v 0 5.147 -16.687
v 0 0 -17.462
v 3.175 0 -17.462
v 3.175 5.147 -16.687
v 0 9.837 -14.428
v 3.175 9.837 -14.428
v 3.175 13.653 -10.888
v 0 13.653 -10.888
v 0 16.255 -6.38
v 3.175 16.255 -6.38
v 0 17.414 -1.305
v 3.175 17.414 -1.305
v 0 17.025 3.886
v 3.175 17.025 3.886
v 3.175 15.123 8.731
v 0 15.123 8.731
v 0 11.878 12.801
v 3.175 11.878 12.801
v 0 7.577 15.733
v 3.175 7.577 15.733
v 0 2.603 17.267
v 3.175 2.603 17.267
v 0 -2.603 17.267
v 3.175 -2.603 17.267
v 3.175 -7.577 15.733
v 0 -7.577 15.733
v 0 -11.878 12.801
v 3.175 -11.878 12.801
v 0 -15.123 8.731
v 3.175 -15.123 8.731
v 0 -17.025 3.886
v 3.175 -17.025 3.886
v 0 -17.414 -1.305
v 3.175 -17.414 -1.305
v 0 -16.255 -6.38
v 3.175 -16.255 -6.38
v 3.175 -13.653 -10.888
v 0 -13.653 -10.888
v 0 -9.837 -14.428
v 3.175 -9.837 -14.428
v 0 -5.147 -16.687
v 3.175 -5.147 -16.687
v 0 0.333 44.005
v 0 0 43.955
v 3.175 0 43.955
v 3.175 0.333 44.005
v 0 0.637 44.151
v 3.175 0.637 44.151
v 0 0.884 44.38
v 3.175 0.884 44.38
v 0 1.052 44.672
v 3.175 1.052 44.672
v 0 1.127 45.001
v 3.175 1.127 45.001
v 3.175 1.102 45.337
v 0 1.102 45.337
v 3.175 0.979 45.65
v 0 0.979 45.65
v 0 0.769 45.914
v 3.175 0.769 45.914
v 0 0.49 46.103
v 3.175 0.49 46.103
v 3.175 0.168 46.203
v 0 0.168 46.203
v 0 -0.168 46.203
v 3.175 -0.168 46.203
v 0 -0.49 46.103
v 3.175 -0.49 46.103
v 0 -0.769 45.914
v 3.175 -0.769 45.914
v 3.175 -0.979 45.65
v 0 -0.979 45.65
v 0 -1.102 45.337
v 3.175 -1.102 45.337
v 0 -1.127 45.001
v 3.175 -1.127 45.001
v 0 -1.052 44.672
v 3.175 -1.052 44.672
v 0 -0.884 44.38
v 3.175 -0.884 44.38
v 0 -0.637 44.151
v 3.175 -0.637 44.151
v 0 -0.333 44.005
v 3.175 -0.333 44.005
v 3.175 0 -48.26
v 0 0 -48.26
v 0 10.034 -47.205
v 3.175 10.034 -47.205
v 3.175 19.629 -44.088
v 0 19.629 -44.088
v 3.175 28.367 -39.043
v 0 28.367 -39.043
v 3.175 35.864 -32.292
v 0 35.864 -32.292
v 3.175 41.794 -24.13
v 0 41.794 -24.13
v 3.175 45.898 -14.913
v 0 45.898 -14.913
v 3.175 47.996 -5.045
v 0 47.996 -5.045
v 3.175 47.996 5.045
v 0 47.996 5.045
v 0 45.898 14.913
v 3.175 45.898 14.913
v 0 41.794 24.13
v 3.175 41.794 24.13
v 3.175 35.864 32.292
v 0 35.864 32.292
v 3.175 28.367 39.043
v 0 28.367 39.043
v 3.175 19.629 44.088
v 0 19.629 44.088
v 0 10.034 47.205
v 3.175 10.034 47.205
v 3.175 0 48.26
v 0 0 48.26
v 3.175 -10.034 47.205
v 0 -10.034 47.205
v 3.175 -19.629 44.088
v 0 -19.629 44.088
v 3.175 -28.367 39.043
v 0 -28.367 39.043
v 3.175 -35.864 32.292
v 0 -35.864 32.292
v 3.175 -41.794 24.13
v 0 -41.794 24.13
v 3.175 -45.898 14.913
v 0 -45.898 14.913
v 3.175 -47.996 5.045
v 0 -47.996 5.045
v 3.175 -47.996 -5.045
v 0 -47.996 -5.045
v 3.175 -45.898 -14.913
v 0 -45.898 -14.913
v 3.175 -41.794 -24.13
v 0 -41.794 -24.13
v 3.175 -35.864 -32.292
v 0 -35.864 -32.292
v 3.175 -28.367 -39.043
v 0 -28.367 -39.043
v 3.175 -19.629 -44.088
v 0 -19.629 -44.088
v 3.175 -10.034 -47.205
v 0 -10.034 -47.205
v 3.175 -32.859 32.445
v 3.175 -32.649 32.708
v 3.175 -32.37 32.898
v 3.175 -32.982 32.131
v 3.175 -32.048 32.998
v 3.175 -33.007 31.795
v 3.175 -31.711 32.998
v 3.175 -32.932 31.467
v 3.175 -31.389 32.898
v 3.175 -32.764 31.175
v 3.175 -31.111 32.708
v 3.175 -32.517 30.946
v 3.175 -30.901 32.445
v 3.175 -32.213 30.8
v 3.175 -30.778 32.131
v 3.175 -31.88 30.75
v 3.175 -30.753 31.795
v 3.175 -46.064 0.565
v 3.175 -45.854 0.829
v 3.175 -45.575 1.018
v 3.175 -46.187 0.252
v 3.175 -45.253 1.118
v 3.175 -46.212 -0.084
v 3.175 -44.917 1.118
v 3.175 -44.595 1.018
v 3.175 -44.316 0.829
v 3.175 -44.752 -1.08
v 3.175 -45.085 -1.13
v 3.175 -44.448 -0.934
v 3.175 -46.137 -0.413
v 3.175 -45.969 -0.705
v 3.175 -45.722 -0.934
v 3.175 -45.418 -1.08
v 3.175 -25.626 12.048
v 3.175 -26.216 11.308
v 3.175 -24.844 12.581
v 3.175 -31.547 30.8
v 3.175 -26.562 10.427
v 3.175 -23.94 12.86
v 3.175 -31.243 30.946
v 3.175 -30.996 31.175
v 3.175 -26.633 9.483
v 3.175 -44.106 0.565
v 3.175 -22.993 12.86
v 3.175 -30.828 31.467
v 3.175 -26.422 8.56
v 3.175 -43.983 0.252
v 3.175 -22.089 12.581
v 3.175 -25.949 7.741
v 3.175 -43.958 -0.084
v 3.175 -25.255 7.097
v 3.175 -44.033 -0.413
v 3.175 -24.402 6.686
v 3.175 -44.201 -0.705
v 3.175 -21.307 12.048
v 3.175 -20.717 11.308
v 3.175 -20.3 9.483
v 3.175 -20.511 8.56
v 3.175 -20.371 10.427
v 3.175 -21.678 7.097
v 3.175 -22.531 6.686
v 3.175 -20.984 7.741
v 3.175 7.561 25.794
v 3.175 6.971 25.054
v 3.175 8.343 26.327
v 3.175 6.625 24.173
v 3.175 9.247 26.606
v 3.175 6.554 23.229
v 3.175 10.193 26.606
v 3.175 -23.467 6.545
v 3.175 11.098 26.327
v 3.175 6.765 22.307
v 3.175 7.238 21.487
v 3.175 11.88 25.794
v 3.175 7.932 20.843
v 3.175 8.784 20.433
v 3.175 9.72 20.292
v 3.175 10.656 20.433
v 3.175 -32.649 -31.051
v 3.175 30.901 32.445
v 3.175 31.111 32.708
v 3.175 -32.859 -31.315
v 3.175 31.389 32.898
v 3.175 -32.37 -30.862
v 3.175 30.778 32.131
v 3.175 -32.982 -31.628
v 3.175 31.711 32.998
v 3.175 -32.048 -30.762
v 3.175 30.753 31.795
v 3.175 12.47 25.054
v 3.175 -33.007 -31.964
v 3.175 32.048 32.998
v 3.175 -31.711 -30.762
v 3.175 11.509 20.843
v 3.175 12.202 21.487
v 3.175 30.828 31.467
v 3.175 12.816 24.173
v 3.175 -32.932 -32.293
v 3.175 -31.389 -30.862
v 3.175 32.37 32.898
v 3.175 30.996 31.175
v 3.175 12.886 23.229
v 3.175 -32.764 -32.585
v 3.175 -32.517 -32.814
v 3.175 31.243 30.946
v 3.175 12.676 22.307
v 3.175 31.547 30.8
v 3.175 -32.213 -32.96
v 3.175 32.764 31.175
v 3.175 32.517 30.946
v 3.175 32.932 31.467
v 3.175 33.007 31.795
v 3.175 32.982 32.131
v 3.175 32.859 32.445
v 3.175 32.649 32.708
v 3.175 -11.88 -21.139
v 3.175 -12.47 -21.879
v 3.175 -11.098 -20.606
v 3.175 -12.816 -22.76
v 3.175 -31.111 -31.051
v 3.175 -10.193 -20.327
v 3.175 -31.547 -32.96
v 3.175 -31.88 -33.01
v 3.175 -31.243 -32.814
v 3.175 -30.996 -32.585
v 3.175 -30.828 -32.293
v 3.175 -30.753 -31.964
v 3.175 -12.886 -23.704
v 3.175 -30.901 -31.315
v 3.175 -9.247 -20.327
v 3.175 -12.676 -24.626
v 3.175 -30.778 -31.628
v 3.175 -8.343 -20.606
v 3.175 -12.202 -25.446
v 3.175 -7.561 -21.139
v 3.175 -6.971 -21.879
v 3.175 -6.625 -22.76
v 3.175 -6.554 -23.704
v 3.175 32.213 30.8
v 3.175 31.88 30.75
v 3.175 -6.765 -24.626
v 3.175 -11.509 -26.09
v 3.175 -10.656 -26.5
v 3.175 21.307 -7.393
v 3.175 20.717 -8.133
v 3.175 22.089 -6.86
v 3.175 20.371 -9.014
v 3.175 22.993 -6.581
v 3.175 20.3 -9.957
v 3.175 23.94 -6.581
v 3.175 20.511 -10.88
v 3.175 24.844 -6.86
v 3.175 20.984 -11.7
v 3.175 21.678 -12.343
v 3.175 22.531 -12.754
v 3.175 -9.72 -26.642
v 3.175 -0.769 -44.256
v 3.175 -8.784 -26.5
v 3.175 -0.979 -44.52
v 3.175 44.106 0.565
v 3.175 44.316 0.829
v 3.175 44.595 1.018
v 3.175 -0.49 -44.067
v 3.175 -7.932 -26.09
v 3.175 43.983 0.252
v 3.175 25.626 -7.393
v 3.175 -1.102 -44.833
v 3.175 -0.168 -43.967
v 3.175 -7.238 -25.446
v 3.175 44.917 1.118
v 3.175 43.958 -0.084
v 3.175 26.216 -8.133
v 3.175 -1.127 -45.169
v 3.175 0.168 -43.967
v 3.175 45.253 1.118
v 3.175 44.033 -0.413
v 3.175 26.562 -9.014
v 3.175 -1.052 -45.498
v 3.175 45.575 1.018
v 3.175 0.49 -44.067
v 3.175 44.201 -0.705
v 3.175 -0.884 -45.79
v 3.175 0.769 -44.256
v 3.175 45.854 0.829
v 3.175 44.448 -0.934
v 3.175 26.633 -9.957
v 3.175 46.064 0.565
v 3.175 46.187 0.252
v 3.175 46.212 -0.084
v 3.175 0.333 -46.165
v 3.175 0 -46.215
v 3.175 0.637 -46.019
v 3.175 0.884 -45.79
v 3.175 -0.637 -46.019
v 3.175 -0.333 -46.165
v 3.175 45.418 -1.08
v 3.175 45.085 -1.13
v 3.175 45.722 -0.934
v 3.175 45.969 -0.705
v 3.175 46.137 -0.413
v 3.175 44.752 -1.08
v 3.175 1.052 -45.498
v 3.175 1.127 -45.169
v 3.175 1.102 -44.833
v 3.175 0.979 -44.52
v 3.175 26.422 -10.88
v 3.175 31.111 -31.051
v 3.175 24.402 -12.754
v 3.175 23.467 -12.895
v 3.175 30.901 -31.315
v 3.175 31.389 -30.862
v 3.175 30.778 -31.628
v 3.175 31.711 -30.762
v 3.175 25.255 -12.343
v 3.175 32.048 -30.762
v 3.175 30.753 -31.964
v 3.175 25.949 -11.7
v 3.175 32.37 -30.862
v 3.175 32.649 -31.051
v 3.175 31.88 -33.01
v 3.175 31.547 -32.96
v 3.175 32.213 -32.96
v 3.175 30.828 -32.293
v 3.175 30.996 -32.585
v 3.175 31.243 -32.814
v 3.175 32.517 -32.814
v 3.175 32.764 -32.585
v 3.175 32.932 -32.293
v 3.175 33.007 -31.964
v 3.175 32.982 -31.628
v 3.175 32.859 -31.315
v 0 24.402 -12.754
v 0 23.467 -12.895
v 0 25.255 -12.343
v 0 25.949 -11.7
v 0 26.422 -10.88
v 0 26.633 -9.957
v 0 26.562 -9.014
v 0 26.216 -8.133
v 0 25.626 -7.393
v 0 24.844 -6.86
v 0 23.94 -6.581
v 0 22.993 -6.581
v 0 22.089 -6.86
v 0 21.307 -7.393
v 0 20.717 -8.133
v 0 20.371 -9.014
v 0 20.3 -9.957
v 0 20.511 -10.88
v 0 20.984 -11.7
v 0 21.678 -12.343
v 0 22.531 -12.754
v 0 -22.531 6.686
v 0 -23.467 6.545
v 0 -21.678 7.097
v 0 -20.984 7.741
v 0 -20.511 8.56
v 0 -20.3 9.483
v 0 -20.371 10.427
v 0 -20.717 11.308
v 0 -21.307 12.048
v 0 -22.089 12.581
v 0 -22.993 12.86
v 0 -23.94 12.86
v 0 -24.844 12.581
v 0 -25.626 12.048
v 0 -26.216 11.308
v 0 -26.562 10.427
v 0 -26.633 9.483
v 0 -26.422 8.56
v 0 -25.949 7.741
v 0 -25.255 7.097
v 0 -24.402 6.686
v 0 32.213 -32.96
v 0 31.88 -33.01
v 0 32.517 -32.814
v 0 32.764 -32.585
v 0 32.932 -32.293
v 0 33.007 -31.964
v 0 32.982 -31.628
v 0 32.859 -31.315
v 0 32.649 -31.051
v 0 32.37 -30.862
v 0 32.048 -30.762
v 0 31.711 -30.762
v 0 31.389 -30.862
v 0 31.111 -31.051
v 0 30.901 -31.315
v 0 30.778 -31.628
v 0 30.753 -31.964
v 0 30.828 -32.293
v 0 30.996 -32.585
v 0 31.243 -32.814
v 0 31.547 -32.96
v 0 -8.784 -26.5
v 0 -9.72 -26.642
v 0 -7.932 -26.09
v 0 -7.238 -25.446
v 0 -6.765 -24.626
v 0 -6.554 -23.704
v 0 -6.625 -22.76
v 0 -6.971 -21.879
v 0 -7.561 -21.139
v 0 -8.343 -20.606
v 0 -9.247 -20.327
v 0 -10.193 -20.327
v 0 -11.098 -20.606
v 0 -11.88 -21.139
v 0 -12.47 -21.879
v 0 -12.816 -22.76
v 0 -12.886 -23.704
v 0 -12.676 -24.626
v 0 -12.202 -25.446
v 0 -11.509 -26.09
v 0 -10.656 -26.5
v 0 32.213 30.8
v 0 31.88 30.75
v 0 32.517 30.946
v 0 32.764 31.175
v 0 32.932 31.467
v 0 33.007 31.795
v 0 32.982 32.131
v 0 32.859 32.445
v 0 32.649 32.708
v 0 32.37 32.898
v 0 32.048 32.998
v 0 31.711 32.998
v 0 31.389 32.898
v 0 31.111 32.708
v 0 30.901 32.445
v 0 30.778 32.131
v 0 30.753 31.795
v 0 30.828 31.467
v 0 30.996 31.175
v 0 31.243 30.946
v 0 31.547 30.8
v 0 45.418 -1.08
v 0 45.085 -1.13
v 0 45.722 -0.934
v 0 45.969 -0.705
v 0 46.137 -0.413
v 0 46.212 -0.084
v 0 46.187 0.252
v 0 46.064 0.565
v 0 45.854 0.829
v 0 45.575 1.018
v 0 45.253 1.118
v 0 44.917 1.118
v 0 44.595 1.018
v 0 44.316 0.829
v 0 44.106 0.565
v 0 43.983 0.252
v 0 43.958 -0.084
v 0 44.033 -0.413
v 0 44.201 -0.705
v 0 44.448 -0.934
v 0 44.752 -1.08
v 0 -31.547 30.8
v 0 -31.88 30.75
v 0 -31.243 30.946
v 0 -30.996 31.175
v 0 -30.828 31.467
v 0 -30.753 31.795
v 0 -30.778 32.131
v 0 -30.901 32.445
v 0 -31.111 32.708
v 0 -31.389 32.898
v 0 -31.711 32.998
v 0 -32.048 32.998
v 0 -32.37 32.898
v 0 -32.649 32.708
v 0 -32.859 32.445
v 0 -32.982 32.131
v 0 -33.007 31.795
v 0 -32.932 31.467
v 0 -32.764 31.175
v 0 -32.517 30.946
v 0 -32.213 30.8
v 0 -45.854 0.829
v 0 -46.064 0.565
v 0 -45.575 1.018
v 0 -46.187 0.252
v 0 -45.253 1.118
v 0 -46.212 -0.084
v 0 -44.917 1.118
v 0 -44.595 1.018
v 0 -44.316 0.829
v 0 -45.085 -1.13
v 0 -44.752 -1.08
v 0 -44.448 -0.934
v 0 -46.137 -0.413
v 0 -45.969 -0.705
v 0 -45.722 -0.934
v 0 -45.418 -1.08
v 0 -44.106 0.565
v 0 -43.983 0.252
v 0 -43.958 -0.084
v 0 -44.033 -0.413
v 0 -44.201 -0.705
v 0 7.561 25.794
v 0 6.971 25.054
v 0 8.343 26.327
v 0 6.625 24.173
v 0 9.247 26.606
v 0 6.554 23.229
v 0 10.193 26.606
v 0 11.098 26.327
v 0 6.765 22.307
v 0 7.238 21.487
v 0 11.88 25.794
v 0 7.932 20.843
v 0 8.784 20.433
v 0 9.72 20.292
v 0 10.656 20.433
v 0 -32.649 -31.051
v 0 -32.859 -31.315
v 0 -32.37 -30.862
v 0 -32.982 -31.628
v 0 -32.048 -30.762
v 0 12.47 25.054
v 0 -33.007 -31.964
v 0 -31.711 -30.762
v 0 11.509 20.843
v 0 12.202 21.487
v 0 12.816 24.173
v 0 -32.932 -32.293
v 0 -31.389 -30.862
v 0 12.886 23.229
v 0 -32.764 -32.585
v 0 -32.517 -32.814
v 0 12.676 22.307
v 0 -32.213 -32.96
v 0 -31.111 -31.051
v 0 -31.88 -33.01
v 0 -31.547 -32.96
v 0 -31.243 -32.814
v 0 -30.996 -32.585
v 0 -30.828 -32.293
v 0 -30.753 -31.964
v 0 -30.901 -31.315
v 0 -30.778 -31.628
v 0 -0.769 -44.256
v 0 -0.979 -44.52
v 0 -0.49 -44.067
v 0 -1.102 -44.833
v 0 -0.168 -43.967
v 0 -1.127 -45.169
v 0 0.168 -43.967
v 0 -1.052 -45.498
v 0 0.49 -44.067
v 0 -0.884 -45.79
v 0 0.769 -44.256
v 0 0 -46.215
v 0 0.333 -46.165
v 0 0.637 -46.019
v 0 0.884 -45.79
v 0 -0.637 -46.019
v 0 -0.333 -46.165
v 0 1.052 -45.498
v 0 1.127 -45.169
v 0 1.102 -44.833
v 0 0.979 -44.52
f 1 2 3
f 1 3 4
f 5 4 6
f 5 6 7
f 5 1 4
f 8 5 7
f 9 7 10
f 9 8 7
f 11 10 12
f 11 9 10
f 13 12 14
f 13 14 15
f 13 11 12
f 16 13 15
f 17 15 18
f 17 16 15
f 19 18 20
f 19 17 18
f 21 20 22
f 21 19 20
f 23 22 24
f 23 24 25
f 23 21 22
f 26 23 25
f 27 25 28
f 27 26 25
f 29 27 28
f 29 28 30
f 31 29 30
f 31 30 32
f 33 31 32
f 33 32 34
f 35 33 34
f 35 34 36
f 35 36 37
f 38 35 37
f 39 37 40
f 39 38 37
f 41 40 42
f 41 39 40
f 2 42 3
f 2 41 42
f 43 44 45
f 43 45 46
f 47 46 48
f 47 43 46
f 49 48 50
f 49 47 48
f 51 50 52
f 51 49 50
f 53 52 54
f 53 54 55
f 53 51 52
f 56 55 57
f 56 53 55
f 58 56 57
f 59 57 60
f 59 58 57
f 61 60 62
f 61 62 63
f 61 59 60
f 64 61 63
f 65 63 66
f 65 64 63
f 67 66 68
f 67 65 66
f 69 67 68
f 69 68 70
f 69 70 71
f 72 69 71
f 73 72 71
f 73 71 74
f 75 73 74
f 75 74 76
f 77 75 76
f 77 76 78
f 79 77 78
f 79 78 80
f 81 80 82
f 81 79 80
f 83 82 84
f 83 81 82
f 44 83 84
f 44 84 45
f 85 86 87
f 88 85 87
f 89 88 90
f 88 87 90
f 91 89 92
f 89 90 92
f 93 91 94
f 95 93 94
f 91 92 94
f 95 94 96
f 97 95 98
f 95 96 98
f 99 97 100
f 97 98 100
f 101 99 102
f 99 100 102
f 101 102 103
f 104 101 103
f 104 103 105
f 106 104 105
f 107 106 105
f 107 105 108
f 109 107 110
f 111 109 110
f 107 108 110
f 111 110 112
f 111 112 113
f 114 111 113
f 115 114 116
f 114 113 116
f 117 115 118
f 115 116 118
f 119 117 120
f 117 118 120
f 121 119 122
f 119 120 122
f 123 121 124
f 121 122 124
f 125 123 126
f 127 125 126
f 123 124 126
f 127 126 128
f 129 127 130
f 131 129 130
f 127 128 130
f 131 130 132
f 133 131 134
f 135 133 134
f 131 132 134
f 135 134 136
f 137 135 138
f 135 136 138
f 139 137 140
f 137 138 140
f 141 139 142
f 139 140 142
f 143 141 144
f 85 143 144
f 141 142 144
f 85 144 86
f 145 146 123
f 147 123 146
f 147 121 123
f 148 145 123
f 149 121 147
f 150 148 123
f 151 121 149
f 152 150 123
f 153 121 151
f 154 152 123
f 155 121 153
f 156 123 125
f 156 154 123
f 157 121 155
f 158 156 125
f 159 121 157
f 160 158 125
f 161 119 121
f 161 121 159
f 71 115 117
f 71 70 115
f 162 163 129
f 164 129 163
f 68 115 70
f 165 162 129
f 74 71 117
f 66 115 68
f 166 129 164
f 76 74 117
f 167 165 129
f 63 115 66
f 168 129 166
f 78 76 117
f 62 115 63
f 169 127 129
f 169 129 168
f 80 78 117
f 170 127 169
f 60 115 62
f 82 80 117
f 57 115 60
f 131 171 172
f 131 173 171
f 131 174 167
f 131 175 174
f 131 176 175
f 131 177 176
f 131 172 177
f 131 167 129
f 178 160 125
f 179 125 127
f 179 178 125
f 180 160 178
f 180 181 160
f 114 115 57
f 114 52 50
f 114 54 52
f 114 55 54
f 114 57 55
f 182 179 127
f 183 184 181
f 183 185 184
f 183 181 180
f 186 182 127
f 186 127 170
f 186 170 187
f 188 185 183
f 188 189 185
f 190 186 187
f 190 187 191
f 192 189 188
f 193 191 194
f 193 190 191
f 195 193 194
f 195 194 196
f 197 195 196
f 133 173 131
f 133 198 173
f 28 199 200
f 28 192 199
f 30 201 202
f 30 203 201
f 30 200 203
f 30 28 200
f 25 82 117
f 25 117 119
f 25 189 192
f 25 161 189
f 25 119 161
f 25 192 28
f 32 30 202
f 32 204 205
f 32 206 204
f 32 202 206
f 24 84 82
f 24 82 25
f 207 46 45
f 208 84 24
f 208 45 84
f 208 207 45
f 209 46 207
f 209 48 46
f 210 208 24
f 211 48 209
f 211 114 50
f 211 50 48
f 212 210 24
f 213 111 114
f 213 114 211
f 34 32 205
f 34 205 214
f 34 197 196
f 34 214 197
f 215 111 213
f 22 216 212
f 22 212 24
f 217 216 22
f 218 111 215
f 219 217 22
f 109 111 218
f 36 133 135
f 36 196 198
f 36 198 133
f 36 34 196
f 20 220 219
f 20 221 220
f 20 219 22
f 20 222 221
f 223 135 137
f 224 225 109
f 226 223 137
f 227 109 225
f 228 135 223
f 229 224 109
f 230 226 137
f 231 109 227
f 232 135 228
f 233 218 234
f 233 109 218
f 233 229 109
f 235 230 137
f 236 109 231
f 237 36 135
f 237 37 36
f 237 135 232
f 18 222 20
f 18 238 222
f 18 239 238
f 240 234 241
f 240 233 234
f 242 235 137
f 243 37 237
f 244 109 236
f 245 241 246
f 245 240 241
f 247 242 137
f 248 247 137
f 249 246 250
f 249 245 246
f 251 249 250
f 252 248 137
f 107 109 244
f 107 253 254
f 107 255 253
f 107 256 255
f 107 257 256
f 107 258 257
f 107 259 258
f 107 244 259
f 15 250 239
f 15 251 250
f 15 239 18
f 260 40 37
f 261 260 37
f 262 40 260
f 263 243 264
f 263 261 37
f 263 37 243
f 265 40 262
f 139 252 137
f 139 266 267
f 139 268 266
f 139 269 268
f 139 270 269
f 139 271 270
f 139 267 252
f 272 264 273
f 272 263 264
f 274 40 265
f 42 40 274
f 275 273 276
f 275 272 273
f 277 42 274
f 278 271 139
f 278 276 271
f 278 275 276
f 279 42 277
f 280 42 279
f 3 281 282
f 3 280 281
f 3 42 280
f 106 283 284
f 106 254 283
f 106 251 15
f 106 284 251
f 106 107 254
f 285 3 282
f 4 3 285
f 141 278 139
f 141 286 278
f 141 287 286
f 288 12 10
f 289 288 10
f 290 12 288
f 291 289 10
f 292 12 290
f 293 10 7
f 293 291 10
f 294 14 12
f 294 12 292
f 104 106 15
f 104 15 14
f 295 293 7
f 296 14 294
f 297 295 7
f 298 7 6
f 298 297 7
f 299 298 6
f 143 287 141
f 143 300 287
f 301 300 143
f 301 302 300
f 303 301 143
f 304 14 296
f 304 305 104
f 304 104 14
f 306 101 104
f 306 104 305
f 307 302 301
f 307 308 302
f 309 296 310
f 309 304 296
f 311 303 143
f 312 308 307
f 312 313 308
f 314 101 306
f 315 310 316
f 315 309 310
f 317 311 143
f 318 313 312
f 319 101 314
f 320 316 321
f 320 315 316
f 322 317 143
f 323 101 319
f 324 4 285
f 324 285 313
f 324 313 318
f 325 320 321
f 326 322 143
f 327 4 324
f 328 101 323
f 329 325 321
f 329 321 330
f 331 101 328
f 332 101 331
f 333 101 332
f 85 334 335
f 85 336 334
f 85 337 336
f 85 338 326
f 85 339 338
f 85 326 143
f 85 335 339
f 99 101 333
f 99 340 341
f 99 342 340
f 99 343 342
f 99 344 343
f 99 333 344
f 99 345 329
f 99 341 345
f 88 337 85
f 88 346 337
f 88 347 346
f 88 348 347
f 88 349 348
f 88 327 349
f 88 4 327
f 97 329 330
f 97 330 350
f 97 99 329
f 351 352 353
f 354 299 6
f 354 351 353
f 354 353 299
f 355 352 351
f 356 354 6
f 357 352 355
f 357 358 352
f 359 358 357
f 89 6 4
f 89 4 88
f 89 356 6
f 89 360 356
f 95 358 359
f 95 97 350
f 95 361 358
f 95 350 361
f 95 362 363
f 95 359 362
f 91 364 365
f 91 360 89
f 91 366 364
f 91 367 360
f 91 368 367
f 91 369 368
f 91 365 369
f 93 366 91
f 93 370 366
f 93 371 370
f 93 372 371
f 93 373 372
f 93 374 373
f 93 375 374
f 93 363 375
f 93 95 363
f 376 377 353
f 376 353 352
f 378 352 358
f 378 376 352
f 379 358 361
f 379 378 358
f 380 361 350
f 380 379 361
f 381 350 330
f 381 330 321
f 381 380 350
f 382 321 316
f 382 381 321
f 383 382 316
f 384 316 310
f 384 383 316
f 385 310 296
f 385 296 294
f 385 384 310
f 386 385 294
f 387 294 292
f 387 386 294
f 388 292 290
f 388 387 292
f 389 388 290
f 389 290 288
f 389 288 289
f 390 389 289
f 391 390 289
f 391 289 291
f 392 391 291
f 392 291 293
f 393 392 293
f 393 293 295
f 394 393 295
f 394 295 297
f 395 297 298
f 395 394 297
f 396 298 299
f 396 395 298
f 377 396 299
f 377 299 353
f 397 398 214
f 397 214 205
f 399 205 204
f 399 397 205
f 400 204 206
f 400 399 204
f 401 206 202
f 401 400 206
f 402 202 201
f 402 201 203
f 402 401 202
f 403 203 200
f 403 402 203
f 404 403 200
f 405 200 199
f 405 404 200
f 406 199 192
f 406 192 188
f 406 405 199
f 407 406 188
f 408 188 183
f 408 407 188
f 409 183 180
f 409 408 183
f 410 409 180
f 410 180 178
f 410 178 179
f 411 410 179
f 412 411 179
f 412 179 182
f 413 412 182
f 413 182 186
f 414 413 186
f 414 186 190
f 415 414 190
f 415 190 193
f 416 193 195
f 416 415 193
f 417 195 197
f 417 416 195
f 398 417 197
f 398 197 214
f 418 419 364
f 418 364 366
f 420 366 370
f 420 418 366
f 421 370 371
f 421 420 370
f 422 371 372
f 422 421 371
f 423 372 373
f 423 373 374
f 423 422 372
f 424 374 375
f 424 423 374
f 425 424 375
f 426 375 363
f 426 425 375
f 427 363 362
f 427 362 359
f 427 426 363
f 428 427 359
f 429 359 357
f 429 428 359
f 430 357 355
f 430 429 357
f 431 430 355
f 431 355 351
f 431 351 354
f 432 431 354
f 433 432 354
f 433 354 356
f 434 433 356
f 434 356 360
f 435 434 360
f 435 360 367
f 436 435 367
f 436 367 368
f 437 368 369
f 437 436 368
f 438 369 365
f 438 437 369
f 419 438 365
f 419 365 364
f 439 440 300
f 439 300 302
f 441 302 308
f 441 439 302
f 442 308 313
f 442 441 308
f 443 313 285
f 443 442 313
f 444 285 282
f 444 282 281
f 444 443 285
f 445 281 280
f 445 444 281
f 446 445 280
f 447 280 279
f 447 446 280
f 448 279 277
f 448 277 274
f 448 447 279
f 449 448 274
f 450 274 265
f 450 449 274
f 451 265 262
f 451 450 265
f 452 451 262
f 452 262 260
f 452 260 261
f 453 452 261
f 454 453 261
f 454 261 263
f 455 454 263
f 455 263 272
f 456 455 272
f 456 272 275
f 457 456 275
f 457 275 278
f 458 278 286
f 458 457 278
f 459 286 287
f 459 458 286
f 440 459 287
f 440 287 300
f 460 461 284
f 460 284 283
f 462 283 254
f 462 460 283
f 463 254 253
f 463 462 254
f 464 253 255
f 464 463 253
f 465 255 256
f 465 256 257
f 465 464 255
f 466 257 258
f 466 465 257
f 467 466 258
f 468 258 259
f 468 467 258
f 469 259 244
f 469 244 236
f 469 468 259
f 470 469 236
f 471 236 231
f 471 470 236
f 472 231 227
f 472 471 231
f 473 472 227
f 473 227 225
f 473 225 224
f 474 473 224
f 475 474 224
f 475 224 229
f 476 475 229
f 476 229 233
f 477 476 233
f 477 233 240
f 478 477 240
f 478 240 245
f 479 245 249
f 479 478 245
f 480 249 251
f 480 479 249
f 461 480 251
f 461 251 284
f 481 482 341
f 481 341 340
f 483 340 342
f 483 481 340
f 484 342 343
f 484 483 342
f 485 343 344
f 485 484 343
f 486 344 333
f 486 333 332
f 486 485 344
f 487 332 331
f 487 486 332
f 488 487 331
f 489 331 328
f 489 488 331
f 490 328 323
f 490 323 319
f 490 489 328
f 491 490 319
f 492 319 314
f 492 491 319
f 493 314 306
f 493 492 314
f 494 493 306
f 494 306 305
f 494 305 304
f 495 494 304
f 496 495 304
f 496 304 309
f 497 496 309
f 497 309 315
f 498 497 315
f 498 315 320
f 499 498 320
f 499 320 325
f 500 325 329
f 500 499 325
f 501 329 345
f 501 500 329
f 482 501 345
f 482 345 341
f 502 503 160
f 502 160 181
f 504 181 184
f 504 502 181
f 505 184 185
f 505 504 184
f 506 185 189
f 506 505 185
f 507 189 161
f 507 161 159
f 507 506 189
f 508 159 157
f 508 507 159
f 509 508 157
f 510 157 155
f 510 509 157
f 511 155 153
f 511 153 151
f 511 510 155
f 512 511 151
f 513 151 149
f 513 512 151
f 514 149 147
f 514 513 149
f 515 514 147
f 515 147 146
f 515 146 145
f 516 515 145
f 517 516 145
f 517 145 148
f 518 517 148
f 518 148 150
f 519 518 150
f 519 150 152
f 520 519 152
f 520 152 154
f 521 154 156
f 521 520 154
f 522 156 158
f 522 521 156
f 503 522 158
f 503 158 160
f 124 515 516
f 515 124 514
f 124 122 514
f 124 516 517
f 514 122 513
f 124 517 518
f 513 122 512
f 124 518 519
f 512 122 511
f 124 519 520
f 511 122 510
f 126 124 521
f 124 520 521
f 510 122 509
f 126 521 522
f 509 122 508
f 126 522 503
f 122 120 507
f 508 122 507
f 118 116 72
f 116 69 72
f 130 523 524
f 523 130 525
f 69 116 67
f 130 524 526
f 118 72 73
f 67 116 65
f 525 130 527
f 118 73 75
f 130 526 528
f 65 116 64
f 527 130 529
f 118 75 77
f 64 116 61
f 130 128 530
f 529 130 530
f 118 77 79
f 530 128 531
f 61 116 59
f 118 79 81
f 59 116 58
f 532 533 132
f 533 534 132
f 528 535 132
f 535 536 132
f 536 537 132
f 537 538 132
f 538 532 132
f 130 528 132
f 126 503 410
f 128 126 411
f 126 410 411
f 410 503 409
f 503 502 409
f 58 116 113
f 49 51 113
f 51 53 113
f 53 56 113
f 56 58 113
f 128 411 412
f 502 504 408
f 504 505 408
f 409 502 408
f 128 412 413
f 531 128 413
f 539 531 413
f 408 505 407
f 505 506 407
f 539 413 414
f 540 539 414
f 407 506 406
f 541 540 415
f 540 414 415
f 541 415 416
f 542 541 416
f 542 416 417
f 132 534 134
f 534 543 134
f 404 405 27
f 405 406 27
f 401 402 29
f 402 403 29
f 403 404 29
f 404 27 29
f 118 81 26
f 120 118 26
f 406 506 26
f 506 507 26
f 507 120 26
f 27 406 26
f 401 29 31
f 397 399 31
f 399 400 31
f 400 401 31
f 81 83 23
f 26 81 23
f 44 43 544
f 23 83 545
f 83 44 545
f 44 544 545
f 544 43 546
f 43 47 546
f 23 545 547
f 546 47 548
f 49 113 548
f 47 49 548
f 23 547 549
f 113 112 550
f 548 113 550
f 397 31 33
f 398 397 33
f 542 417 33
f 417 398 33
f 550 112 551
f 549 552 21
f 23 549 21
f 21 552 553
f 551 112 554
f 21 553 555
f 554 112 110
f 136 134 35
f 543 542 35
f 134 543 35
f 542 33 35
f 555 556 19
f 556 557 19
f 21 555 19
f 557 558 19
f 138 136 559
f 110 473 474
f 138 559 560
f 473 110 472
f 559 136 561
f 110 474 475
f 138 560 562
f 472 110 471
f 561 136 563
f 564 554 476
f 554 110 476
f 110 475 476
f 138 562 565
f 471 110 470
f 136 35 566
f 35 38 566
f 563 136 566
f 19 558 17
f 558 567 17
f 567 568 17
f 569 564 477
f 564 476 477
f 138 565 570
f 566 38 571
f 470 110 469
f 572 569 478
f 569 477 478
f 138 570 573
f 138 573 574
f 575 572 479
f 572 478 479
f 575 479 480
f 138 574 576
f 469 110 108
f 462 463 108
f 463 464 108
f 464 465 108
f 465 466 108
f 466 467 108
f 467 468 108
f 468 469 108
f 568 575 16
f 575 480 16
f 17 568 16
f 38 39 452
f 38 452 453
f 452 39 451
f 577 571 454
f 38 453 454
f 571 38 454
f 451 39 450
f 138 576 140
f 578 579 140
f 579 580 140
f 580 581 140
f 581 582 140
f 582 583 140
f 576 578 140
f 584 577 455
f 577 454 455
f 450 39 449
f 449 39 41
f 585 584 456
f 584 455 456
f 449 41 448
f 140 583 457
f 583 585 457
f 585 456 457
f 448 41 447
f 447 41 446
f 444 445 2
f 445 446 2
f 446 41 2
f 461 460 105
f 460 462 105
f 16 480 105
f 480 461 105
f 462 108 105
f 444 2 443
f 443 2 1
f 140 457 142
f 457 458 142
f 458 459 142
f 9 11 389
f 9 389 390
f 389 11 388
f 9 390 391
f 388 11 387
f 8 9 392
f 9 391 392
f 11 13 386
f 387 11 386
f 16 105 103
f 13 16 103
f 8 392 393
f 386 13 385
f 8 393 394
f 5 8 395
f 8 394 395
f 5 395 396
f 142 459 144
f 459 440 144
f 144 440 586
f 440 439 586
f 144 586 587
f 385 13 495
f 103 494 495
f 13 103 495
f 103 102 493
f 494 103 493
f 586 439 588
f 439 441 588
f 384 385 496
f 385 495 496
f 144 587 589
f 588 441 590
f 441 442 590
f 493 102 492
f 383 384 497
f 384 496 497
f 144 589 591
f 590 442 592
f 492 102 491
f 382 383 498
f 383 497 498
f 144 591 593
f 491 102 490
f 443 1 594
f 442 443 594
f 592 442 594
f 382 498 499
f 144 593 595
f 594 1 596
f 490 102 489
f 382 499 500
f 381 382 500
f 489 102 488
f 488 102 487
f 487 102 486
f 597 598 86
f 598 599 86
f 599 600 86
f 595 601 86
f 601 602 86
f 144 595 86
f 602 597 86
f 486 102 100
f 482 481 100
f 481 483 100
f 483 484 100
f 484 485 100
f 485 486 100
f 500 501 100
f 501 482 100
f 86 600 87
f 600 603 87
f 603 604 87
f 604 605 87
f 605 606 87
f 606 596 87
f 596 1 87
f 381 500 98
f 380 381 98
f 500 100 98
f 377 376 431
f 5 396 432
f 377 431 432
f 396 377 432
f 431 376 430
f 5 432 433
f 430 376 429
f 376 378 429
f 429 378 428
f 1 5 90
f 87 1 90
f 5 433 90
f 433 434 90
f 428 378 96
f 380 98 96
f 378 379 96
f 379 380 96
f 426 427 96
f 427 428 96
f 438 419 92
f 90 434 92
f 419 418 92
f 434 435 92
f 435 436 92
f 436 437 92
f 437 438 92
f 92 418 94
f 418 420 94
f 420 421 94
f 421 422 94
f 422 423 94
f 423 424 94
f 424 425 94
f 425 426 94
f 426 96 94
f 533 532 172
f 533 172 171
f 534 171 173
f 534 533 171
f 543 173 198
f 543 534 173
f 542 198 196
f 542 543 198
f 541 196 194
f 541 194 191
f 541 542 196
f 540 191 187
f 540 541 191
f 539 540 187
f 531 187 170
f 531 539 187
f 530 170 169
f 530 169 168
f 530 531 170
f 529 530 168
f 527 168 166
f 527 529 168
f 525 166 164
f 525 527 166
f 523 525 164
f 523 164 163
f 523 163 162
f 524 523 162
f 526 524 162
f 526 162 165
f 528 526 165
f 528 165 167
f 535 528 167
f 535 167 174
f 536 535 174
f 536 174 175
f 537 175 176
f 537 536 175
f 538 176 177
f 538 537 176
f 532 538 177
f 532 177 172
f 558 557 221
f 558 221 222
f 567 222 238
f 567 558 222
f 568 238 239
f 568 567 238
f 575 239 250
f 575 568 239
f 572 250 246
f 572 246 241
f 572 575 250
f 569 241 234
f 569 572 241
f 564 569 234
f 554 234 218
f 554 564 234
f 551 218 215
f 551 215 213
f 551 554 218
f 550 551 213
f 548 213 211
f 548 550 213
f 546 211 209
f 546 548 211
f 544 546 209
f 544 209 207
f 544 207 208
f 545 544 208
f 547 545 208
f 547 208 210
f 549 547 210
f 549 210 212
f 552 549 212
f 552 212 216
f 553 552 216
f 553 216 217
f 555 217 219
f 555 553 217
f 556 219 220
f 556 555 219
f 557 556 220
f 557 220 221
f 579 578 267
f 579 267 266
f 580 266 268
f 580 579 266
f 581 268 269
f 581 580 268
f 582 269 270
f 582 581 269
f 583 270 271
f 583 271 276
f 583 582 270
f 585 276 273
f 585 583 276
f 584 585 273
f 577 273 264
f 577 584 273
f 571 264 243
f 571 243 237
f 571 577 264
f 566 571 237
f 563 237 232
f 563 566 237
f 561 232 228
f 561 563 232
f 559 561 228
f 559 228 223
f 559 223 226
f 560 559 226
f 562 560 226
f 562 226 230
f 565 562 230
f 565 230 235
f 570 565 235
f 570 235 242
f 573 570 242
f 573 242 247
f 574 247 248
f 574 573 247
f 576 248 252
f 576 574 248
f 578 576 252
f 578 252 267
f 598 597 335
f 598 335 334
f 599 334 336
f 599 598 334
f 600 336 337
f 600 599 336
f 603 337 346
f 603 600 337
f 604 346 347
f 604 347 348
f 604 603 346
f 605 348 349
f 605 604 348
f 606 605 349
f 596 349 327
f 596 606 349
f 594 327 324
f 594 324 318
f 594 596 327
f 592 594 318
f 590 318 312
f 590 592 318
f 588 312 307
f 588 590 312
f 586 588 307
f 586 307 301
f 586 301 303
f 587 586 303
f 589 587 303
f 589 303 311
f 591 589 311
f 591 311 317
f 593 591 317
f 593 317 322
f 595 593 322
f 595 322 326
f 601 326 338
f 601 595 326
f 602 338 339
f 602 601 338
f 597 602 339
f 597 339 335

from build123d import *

# Parameters (mm, degrees)
SKETCH1_R           = 48.26
SKETCH1_R_2         = 1.1303
SKETCH1_R_3         = 17.4625
SKETCH1_R_4         = 3.175
BOSS_EXTRUDE1_DEPTH = 3.175


with BuildPart() as part:
    # Sketch1 → Boss-Extrude1 (new body)
    with BuildSketch(Plane(origin=(0, 0, 0), x_dir=(0, 0, -1), z_dir=(1, 0, 0))):
        Circle(SKETCH1_R)
        with Locations((0, 45.085)):
            Circle(SKETCH1_R_2, mode=Mode.SUBTRACT)
        with Locations((31.87990923, 31.87990923)):
            Circle(SKETCH1_R_2, mode=Mode.SUBTRACT)
        with Locations((45.085, 0)):
            Circle(SKETCH1_R_2, mode=Mode.SUBTRACT)
        with Locations((31.87990923, -31.87990923)):
            Circle(SKETCH1_R_2, mode=Mode.SUBTRACT)
        with Locations((0, -45.085)):
            Circle(SKETCH1_R_2, mode=Mode.SUBTRACT)
        with Locations((-31.87990923, -31.87990923)):
            Circle(SKETCH1_R_2, mode=Mode.SUBTRACT)
        with Locations((-45.085, 0)):
            Circle(SKETCH1_R_2, mode=Mode.SUBTRACT)
        with Locations((-31.87990923, 31.87990923)):
            Circle(SKETCH1_R_2, mode=Mode.SUBTRACT)
        Circle(SKETCH1_R_3, mode=Mode.SUBTRACT)
        with Locations((9.720159182, 23.466540126)):
            Circle(SKETCH1_R_4, mode=Mode.SUBTRACT)
        with Locations((23.466540126, -9.720159182)):
            Circle(SKETCH1_R_4, mode=Mode.SUBTRACT)
        with Locations((-9.720159182, -23.466540126)):
            Circle(SKETCH1_R_4, mode=Mode.SUBTRACT)
        with Locations((-23.466540126, 9.720159182)):
            Circle(SKETCH1_R_4, mode=Mode.SUBTRACT)
    extrude(amount=BOSS_EXTRUDE1_DEPTH)


solid = part.part
